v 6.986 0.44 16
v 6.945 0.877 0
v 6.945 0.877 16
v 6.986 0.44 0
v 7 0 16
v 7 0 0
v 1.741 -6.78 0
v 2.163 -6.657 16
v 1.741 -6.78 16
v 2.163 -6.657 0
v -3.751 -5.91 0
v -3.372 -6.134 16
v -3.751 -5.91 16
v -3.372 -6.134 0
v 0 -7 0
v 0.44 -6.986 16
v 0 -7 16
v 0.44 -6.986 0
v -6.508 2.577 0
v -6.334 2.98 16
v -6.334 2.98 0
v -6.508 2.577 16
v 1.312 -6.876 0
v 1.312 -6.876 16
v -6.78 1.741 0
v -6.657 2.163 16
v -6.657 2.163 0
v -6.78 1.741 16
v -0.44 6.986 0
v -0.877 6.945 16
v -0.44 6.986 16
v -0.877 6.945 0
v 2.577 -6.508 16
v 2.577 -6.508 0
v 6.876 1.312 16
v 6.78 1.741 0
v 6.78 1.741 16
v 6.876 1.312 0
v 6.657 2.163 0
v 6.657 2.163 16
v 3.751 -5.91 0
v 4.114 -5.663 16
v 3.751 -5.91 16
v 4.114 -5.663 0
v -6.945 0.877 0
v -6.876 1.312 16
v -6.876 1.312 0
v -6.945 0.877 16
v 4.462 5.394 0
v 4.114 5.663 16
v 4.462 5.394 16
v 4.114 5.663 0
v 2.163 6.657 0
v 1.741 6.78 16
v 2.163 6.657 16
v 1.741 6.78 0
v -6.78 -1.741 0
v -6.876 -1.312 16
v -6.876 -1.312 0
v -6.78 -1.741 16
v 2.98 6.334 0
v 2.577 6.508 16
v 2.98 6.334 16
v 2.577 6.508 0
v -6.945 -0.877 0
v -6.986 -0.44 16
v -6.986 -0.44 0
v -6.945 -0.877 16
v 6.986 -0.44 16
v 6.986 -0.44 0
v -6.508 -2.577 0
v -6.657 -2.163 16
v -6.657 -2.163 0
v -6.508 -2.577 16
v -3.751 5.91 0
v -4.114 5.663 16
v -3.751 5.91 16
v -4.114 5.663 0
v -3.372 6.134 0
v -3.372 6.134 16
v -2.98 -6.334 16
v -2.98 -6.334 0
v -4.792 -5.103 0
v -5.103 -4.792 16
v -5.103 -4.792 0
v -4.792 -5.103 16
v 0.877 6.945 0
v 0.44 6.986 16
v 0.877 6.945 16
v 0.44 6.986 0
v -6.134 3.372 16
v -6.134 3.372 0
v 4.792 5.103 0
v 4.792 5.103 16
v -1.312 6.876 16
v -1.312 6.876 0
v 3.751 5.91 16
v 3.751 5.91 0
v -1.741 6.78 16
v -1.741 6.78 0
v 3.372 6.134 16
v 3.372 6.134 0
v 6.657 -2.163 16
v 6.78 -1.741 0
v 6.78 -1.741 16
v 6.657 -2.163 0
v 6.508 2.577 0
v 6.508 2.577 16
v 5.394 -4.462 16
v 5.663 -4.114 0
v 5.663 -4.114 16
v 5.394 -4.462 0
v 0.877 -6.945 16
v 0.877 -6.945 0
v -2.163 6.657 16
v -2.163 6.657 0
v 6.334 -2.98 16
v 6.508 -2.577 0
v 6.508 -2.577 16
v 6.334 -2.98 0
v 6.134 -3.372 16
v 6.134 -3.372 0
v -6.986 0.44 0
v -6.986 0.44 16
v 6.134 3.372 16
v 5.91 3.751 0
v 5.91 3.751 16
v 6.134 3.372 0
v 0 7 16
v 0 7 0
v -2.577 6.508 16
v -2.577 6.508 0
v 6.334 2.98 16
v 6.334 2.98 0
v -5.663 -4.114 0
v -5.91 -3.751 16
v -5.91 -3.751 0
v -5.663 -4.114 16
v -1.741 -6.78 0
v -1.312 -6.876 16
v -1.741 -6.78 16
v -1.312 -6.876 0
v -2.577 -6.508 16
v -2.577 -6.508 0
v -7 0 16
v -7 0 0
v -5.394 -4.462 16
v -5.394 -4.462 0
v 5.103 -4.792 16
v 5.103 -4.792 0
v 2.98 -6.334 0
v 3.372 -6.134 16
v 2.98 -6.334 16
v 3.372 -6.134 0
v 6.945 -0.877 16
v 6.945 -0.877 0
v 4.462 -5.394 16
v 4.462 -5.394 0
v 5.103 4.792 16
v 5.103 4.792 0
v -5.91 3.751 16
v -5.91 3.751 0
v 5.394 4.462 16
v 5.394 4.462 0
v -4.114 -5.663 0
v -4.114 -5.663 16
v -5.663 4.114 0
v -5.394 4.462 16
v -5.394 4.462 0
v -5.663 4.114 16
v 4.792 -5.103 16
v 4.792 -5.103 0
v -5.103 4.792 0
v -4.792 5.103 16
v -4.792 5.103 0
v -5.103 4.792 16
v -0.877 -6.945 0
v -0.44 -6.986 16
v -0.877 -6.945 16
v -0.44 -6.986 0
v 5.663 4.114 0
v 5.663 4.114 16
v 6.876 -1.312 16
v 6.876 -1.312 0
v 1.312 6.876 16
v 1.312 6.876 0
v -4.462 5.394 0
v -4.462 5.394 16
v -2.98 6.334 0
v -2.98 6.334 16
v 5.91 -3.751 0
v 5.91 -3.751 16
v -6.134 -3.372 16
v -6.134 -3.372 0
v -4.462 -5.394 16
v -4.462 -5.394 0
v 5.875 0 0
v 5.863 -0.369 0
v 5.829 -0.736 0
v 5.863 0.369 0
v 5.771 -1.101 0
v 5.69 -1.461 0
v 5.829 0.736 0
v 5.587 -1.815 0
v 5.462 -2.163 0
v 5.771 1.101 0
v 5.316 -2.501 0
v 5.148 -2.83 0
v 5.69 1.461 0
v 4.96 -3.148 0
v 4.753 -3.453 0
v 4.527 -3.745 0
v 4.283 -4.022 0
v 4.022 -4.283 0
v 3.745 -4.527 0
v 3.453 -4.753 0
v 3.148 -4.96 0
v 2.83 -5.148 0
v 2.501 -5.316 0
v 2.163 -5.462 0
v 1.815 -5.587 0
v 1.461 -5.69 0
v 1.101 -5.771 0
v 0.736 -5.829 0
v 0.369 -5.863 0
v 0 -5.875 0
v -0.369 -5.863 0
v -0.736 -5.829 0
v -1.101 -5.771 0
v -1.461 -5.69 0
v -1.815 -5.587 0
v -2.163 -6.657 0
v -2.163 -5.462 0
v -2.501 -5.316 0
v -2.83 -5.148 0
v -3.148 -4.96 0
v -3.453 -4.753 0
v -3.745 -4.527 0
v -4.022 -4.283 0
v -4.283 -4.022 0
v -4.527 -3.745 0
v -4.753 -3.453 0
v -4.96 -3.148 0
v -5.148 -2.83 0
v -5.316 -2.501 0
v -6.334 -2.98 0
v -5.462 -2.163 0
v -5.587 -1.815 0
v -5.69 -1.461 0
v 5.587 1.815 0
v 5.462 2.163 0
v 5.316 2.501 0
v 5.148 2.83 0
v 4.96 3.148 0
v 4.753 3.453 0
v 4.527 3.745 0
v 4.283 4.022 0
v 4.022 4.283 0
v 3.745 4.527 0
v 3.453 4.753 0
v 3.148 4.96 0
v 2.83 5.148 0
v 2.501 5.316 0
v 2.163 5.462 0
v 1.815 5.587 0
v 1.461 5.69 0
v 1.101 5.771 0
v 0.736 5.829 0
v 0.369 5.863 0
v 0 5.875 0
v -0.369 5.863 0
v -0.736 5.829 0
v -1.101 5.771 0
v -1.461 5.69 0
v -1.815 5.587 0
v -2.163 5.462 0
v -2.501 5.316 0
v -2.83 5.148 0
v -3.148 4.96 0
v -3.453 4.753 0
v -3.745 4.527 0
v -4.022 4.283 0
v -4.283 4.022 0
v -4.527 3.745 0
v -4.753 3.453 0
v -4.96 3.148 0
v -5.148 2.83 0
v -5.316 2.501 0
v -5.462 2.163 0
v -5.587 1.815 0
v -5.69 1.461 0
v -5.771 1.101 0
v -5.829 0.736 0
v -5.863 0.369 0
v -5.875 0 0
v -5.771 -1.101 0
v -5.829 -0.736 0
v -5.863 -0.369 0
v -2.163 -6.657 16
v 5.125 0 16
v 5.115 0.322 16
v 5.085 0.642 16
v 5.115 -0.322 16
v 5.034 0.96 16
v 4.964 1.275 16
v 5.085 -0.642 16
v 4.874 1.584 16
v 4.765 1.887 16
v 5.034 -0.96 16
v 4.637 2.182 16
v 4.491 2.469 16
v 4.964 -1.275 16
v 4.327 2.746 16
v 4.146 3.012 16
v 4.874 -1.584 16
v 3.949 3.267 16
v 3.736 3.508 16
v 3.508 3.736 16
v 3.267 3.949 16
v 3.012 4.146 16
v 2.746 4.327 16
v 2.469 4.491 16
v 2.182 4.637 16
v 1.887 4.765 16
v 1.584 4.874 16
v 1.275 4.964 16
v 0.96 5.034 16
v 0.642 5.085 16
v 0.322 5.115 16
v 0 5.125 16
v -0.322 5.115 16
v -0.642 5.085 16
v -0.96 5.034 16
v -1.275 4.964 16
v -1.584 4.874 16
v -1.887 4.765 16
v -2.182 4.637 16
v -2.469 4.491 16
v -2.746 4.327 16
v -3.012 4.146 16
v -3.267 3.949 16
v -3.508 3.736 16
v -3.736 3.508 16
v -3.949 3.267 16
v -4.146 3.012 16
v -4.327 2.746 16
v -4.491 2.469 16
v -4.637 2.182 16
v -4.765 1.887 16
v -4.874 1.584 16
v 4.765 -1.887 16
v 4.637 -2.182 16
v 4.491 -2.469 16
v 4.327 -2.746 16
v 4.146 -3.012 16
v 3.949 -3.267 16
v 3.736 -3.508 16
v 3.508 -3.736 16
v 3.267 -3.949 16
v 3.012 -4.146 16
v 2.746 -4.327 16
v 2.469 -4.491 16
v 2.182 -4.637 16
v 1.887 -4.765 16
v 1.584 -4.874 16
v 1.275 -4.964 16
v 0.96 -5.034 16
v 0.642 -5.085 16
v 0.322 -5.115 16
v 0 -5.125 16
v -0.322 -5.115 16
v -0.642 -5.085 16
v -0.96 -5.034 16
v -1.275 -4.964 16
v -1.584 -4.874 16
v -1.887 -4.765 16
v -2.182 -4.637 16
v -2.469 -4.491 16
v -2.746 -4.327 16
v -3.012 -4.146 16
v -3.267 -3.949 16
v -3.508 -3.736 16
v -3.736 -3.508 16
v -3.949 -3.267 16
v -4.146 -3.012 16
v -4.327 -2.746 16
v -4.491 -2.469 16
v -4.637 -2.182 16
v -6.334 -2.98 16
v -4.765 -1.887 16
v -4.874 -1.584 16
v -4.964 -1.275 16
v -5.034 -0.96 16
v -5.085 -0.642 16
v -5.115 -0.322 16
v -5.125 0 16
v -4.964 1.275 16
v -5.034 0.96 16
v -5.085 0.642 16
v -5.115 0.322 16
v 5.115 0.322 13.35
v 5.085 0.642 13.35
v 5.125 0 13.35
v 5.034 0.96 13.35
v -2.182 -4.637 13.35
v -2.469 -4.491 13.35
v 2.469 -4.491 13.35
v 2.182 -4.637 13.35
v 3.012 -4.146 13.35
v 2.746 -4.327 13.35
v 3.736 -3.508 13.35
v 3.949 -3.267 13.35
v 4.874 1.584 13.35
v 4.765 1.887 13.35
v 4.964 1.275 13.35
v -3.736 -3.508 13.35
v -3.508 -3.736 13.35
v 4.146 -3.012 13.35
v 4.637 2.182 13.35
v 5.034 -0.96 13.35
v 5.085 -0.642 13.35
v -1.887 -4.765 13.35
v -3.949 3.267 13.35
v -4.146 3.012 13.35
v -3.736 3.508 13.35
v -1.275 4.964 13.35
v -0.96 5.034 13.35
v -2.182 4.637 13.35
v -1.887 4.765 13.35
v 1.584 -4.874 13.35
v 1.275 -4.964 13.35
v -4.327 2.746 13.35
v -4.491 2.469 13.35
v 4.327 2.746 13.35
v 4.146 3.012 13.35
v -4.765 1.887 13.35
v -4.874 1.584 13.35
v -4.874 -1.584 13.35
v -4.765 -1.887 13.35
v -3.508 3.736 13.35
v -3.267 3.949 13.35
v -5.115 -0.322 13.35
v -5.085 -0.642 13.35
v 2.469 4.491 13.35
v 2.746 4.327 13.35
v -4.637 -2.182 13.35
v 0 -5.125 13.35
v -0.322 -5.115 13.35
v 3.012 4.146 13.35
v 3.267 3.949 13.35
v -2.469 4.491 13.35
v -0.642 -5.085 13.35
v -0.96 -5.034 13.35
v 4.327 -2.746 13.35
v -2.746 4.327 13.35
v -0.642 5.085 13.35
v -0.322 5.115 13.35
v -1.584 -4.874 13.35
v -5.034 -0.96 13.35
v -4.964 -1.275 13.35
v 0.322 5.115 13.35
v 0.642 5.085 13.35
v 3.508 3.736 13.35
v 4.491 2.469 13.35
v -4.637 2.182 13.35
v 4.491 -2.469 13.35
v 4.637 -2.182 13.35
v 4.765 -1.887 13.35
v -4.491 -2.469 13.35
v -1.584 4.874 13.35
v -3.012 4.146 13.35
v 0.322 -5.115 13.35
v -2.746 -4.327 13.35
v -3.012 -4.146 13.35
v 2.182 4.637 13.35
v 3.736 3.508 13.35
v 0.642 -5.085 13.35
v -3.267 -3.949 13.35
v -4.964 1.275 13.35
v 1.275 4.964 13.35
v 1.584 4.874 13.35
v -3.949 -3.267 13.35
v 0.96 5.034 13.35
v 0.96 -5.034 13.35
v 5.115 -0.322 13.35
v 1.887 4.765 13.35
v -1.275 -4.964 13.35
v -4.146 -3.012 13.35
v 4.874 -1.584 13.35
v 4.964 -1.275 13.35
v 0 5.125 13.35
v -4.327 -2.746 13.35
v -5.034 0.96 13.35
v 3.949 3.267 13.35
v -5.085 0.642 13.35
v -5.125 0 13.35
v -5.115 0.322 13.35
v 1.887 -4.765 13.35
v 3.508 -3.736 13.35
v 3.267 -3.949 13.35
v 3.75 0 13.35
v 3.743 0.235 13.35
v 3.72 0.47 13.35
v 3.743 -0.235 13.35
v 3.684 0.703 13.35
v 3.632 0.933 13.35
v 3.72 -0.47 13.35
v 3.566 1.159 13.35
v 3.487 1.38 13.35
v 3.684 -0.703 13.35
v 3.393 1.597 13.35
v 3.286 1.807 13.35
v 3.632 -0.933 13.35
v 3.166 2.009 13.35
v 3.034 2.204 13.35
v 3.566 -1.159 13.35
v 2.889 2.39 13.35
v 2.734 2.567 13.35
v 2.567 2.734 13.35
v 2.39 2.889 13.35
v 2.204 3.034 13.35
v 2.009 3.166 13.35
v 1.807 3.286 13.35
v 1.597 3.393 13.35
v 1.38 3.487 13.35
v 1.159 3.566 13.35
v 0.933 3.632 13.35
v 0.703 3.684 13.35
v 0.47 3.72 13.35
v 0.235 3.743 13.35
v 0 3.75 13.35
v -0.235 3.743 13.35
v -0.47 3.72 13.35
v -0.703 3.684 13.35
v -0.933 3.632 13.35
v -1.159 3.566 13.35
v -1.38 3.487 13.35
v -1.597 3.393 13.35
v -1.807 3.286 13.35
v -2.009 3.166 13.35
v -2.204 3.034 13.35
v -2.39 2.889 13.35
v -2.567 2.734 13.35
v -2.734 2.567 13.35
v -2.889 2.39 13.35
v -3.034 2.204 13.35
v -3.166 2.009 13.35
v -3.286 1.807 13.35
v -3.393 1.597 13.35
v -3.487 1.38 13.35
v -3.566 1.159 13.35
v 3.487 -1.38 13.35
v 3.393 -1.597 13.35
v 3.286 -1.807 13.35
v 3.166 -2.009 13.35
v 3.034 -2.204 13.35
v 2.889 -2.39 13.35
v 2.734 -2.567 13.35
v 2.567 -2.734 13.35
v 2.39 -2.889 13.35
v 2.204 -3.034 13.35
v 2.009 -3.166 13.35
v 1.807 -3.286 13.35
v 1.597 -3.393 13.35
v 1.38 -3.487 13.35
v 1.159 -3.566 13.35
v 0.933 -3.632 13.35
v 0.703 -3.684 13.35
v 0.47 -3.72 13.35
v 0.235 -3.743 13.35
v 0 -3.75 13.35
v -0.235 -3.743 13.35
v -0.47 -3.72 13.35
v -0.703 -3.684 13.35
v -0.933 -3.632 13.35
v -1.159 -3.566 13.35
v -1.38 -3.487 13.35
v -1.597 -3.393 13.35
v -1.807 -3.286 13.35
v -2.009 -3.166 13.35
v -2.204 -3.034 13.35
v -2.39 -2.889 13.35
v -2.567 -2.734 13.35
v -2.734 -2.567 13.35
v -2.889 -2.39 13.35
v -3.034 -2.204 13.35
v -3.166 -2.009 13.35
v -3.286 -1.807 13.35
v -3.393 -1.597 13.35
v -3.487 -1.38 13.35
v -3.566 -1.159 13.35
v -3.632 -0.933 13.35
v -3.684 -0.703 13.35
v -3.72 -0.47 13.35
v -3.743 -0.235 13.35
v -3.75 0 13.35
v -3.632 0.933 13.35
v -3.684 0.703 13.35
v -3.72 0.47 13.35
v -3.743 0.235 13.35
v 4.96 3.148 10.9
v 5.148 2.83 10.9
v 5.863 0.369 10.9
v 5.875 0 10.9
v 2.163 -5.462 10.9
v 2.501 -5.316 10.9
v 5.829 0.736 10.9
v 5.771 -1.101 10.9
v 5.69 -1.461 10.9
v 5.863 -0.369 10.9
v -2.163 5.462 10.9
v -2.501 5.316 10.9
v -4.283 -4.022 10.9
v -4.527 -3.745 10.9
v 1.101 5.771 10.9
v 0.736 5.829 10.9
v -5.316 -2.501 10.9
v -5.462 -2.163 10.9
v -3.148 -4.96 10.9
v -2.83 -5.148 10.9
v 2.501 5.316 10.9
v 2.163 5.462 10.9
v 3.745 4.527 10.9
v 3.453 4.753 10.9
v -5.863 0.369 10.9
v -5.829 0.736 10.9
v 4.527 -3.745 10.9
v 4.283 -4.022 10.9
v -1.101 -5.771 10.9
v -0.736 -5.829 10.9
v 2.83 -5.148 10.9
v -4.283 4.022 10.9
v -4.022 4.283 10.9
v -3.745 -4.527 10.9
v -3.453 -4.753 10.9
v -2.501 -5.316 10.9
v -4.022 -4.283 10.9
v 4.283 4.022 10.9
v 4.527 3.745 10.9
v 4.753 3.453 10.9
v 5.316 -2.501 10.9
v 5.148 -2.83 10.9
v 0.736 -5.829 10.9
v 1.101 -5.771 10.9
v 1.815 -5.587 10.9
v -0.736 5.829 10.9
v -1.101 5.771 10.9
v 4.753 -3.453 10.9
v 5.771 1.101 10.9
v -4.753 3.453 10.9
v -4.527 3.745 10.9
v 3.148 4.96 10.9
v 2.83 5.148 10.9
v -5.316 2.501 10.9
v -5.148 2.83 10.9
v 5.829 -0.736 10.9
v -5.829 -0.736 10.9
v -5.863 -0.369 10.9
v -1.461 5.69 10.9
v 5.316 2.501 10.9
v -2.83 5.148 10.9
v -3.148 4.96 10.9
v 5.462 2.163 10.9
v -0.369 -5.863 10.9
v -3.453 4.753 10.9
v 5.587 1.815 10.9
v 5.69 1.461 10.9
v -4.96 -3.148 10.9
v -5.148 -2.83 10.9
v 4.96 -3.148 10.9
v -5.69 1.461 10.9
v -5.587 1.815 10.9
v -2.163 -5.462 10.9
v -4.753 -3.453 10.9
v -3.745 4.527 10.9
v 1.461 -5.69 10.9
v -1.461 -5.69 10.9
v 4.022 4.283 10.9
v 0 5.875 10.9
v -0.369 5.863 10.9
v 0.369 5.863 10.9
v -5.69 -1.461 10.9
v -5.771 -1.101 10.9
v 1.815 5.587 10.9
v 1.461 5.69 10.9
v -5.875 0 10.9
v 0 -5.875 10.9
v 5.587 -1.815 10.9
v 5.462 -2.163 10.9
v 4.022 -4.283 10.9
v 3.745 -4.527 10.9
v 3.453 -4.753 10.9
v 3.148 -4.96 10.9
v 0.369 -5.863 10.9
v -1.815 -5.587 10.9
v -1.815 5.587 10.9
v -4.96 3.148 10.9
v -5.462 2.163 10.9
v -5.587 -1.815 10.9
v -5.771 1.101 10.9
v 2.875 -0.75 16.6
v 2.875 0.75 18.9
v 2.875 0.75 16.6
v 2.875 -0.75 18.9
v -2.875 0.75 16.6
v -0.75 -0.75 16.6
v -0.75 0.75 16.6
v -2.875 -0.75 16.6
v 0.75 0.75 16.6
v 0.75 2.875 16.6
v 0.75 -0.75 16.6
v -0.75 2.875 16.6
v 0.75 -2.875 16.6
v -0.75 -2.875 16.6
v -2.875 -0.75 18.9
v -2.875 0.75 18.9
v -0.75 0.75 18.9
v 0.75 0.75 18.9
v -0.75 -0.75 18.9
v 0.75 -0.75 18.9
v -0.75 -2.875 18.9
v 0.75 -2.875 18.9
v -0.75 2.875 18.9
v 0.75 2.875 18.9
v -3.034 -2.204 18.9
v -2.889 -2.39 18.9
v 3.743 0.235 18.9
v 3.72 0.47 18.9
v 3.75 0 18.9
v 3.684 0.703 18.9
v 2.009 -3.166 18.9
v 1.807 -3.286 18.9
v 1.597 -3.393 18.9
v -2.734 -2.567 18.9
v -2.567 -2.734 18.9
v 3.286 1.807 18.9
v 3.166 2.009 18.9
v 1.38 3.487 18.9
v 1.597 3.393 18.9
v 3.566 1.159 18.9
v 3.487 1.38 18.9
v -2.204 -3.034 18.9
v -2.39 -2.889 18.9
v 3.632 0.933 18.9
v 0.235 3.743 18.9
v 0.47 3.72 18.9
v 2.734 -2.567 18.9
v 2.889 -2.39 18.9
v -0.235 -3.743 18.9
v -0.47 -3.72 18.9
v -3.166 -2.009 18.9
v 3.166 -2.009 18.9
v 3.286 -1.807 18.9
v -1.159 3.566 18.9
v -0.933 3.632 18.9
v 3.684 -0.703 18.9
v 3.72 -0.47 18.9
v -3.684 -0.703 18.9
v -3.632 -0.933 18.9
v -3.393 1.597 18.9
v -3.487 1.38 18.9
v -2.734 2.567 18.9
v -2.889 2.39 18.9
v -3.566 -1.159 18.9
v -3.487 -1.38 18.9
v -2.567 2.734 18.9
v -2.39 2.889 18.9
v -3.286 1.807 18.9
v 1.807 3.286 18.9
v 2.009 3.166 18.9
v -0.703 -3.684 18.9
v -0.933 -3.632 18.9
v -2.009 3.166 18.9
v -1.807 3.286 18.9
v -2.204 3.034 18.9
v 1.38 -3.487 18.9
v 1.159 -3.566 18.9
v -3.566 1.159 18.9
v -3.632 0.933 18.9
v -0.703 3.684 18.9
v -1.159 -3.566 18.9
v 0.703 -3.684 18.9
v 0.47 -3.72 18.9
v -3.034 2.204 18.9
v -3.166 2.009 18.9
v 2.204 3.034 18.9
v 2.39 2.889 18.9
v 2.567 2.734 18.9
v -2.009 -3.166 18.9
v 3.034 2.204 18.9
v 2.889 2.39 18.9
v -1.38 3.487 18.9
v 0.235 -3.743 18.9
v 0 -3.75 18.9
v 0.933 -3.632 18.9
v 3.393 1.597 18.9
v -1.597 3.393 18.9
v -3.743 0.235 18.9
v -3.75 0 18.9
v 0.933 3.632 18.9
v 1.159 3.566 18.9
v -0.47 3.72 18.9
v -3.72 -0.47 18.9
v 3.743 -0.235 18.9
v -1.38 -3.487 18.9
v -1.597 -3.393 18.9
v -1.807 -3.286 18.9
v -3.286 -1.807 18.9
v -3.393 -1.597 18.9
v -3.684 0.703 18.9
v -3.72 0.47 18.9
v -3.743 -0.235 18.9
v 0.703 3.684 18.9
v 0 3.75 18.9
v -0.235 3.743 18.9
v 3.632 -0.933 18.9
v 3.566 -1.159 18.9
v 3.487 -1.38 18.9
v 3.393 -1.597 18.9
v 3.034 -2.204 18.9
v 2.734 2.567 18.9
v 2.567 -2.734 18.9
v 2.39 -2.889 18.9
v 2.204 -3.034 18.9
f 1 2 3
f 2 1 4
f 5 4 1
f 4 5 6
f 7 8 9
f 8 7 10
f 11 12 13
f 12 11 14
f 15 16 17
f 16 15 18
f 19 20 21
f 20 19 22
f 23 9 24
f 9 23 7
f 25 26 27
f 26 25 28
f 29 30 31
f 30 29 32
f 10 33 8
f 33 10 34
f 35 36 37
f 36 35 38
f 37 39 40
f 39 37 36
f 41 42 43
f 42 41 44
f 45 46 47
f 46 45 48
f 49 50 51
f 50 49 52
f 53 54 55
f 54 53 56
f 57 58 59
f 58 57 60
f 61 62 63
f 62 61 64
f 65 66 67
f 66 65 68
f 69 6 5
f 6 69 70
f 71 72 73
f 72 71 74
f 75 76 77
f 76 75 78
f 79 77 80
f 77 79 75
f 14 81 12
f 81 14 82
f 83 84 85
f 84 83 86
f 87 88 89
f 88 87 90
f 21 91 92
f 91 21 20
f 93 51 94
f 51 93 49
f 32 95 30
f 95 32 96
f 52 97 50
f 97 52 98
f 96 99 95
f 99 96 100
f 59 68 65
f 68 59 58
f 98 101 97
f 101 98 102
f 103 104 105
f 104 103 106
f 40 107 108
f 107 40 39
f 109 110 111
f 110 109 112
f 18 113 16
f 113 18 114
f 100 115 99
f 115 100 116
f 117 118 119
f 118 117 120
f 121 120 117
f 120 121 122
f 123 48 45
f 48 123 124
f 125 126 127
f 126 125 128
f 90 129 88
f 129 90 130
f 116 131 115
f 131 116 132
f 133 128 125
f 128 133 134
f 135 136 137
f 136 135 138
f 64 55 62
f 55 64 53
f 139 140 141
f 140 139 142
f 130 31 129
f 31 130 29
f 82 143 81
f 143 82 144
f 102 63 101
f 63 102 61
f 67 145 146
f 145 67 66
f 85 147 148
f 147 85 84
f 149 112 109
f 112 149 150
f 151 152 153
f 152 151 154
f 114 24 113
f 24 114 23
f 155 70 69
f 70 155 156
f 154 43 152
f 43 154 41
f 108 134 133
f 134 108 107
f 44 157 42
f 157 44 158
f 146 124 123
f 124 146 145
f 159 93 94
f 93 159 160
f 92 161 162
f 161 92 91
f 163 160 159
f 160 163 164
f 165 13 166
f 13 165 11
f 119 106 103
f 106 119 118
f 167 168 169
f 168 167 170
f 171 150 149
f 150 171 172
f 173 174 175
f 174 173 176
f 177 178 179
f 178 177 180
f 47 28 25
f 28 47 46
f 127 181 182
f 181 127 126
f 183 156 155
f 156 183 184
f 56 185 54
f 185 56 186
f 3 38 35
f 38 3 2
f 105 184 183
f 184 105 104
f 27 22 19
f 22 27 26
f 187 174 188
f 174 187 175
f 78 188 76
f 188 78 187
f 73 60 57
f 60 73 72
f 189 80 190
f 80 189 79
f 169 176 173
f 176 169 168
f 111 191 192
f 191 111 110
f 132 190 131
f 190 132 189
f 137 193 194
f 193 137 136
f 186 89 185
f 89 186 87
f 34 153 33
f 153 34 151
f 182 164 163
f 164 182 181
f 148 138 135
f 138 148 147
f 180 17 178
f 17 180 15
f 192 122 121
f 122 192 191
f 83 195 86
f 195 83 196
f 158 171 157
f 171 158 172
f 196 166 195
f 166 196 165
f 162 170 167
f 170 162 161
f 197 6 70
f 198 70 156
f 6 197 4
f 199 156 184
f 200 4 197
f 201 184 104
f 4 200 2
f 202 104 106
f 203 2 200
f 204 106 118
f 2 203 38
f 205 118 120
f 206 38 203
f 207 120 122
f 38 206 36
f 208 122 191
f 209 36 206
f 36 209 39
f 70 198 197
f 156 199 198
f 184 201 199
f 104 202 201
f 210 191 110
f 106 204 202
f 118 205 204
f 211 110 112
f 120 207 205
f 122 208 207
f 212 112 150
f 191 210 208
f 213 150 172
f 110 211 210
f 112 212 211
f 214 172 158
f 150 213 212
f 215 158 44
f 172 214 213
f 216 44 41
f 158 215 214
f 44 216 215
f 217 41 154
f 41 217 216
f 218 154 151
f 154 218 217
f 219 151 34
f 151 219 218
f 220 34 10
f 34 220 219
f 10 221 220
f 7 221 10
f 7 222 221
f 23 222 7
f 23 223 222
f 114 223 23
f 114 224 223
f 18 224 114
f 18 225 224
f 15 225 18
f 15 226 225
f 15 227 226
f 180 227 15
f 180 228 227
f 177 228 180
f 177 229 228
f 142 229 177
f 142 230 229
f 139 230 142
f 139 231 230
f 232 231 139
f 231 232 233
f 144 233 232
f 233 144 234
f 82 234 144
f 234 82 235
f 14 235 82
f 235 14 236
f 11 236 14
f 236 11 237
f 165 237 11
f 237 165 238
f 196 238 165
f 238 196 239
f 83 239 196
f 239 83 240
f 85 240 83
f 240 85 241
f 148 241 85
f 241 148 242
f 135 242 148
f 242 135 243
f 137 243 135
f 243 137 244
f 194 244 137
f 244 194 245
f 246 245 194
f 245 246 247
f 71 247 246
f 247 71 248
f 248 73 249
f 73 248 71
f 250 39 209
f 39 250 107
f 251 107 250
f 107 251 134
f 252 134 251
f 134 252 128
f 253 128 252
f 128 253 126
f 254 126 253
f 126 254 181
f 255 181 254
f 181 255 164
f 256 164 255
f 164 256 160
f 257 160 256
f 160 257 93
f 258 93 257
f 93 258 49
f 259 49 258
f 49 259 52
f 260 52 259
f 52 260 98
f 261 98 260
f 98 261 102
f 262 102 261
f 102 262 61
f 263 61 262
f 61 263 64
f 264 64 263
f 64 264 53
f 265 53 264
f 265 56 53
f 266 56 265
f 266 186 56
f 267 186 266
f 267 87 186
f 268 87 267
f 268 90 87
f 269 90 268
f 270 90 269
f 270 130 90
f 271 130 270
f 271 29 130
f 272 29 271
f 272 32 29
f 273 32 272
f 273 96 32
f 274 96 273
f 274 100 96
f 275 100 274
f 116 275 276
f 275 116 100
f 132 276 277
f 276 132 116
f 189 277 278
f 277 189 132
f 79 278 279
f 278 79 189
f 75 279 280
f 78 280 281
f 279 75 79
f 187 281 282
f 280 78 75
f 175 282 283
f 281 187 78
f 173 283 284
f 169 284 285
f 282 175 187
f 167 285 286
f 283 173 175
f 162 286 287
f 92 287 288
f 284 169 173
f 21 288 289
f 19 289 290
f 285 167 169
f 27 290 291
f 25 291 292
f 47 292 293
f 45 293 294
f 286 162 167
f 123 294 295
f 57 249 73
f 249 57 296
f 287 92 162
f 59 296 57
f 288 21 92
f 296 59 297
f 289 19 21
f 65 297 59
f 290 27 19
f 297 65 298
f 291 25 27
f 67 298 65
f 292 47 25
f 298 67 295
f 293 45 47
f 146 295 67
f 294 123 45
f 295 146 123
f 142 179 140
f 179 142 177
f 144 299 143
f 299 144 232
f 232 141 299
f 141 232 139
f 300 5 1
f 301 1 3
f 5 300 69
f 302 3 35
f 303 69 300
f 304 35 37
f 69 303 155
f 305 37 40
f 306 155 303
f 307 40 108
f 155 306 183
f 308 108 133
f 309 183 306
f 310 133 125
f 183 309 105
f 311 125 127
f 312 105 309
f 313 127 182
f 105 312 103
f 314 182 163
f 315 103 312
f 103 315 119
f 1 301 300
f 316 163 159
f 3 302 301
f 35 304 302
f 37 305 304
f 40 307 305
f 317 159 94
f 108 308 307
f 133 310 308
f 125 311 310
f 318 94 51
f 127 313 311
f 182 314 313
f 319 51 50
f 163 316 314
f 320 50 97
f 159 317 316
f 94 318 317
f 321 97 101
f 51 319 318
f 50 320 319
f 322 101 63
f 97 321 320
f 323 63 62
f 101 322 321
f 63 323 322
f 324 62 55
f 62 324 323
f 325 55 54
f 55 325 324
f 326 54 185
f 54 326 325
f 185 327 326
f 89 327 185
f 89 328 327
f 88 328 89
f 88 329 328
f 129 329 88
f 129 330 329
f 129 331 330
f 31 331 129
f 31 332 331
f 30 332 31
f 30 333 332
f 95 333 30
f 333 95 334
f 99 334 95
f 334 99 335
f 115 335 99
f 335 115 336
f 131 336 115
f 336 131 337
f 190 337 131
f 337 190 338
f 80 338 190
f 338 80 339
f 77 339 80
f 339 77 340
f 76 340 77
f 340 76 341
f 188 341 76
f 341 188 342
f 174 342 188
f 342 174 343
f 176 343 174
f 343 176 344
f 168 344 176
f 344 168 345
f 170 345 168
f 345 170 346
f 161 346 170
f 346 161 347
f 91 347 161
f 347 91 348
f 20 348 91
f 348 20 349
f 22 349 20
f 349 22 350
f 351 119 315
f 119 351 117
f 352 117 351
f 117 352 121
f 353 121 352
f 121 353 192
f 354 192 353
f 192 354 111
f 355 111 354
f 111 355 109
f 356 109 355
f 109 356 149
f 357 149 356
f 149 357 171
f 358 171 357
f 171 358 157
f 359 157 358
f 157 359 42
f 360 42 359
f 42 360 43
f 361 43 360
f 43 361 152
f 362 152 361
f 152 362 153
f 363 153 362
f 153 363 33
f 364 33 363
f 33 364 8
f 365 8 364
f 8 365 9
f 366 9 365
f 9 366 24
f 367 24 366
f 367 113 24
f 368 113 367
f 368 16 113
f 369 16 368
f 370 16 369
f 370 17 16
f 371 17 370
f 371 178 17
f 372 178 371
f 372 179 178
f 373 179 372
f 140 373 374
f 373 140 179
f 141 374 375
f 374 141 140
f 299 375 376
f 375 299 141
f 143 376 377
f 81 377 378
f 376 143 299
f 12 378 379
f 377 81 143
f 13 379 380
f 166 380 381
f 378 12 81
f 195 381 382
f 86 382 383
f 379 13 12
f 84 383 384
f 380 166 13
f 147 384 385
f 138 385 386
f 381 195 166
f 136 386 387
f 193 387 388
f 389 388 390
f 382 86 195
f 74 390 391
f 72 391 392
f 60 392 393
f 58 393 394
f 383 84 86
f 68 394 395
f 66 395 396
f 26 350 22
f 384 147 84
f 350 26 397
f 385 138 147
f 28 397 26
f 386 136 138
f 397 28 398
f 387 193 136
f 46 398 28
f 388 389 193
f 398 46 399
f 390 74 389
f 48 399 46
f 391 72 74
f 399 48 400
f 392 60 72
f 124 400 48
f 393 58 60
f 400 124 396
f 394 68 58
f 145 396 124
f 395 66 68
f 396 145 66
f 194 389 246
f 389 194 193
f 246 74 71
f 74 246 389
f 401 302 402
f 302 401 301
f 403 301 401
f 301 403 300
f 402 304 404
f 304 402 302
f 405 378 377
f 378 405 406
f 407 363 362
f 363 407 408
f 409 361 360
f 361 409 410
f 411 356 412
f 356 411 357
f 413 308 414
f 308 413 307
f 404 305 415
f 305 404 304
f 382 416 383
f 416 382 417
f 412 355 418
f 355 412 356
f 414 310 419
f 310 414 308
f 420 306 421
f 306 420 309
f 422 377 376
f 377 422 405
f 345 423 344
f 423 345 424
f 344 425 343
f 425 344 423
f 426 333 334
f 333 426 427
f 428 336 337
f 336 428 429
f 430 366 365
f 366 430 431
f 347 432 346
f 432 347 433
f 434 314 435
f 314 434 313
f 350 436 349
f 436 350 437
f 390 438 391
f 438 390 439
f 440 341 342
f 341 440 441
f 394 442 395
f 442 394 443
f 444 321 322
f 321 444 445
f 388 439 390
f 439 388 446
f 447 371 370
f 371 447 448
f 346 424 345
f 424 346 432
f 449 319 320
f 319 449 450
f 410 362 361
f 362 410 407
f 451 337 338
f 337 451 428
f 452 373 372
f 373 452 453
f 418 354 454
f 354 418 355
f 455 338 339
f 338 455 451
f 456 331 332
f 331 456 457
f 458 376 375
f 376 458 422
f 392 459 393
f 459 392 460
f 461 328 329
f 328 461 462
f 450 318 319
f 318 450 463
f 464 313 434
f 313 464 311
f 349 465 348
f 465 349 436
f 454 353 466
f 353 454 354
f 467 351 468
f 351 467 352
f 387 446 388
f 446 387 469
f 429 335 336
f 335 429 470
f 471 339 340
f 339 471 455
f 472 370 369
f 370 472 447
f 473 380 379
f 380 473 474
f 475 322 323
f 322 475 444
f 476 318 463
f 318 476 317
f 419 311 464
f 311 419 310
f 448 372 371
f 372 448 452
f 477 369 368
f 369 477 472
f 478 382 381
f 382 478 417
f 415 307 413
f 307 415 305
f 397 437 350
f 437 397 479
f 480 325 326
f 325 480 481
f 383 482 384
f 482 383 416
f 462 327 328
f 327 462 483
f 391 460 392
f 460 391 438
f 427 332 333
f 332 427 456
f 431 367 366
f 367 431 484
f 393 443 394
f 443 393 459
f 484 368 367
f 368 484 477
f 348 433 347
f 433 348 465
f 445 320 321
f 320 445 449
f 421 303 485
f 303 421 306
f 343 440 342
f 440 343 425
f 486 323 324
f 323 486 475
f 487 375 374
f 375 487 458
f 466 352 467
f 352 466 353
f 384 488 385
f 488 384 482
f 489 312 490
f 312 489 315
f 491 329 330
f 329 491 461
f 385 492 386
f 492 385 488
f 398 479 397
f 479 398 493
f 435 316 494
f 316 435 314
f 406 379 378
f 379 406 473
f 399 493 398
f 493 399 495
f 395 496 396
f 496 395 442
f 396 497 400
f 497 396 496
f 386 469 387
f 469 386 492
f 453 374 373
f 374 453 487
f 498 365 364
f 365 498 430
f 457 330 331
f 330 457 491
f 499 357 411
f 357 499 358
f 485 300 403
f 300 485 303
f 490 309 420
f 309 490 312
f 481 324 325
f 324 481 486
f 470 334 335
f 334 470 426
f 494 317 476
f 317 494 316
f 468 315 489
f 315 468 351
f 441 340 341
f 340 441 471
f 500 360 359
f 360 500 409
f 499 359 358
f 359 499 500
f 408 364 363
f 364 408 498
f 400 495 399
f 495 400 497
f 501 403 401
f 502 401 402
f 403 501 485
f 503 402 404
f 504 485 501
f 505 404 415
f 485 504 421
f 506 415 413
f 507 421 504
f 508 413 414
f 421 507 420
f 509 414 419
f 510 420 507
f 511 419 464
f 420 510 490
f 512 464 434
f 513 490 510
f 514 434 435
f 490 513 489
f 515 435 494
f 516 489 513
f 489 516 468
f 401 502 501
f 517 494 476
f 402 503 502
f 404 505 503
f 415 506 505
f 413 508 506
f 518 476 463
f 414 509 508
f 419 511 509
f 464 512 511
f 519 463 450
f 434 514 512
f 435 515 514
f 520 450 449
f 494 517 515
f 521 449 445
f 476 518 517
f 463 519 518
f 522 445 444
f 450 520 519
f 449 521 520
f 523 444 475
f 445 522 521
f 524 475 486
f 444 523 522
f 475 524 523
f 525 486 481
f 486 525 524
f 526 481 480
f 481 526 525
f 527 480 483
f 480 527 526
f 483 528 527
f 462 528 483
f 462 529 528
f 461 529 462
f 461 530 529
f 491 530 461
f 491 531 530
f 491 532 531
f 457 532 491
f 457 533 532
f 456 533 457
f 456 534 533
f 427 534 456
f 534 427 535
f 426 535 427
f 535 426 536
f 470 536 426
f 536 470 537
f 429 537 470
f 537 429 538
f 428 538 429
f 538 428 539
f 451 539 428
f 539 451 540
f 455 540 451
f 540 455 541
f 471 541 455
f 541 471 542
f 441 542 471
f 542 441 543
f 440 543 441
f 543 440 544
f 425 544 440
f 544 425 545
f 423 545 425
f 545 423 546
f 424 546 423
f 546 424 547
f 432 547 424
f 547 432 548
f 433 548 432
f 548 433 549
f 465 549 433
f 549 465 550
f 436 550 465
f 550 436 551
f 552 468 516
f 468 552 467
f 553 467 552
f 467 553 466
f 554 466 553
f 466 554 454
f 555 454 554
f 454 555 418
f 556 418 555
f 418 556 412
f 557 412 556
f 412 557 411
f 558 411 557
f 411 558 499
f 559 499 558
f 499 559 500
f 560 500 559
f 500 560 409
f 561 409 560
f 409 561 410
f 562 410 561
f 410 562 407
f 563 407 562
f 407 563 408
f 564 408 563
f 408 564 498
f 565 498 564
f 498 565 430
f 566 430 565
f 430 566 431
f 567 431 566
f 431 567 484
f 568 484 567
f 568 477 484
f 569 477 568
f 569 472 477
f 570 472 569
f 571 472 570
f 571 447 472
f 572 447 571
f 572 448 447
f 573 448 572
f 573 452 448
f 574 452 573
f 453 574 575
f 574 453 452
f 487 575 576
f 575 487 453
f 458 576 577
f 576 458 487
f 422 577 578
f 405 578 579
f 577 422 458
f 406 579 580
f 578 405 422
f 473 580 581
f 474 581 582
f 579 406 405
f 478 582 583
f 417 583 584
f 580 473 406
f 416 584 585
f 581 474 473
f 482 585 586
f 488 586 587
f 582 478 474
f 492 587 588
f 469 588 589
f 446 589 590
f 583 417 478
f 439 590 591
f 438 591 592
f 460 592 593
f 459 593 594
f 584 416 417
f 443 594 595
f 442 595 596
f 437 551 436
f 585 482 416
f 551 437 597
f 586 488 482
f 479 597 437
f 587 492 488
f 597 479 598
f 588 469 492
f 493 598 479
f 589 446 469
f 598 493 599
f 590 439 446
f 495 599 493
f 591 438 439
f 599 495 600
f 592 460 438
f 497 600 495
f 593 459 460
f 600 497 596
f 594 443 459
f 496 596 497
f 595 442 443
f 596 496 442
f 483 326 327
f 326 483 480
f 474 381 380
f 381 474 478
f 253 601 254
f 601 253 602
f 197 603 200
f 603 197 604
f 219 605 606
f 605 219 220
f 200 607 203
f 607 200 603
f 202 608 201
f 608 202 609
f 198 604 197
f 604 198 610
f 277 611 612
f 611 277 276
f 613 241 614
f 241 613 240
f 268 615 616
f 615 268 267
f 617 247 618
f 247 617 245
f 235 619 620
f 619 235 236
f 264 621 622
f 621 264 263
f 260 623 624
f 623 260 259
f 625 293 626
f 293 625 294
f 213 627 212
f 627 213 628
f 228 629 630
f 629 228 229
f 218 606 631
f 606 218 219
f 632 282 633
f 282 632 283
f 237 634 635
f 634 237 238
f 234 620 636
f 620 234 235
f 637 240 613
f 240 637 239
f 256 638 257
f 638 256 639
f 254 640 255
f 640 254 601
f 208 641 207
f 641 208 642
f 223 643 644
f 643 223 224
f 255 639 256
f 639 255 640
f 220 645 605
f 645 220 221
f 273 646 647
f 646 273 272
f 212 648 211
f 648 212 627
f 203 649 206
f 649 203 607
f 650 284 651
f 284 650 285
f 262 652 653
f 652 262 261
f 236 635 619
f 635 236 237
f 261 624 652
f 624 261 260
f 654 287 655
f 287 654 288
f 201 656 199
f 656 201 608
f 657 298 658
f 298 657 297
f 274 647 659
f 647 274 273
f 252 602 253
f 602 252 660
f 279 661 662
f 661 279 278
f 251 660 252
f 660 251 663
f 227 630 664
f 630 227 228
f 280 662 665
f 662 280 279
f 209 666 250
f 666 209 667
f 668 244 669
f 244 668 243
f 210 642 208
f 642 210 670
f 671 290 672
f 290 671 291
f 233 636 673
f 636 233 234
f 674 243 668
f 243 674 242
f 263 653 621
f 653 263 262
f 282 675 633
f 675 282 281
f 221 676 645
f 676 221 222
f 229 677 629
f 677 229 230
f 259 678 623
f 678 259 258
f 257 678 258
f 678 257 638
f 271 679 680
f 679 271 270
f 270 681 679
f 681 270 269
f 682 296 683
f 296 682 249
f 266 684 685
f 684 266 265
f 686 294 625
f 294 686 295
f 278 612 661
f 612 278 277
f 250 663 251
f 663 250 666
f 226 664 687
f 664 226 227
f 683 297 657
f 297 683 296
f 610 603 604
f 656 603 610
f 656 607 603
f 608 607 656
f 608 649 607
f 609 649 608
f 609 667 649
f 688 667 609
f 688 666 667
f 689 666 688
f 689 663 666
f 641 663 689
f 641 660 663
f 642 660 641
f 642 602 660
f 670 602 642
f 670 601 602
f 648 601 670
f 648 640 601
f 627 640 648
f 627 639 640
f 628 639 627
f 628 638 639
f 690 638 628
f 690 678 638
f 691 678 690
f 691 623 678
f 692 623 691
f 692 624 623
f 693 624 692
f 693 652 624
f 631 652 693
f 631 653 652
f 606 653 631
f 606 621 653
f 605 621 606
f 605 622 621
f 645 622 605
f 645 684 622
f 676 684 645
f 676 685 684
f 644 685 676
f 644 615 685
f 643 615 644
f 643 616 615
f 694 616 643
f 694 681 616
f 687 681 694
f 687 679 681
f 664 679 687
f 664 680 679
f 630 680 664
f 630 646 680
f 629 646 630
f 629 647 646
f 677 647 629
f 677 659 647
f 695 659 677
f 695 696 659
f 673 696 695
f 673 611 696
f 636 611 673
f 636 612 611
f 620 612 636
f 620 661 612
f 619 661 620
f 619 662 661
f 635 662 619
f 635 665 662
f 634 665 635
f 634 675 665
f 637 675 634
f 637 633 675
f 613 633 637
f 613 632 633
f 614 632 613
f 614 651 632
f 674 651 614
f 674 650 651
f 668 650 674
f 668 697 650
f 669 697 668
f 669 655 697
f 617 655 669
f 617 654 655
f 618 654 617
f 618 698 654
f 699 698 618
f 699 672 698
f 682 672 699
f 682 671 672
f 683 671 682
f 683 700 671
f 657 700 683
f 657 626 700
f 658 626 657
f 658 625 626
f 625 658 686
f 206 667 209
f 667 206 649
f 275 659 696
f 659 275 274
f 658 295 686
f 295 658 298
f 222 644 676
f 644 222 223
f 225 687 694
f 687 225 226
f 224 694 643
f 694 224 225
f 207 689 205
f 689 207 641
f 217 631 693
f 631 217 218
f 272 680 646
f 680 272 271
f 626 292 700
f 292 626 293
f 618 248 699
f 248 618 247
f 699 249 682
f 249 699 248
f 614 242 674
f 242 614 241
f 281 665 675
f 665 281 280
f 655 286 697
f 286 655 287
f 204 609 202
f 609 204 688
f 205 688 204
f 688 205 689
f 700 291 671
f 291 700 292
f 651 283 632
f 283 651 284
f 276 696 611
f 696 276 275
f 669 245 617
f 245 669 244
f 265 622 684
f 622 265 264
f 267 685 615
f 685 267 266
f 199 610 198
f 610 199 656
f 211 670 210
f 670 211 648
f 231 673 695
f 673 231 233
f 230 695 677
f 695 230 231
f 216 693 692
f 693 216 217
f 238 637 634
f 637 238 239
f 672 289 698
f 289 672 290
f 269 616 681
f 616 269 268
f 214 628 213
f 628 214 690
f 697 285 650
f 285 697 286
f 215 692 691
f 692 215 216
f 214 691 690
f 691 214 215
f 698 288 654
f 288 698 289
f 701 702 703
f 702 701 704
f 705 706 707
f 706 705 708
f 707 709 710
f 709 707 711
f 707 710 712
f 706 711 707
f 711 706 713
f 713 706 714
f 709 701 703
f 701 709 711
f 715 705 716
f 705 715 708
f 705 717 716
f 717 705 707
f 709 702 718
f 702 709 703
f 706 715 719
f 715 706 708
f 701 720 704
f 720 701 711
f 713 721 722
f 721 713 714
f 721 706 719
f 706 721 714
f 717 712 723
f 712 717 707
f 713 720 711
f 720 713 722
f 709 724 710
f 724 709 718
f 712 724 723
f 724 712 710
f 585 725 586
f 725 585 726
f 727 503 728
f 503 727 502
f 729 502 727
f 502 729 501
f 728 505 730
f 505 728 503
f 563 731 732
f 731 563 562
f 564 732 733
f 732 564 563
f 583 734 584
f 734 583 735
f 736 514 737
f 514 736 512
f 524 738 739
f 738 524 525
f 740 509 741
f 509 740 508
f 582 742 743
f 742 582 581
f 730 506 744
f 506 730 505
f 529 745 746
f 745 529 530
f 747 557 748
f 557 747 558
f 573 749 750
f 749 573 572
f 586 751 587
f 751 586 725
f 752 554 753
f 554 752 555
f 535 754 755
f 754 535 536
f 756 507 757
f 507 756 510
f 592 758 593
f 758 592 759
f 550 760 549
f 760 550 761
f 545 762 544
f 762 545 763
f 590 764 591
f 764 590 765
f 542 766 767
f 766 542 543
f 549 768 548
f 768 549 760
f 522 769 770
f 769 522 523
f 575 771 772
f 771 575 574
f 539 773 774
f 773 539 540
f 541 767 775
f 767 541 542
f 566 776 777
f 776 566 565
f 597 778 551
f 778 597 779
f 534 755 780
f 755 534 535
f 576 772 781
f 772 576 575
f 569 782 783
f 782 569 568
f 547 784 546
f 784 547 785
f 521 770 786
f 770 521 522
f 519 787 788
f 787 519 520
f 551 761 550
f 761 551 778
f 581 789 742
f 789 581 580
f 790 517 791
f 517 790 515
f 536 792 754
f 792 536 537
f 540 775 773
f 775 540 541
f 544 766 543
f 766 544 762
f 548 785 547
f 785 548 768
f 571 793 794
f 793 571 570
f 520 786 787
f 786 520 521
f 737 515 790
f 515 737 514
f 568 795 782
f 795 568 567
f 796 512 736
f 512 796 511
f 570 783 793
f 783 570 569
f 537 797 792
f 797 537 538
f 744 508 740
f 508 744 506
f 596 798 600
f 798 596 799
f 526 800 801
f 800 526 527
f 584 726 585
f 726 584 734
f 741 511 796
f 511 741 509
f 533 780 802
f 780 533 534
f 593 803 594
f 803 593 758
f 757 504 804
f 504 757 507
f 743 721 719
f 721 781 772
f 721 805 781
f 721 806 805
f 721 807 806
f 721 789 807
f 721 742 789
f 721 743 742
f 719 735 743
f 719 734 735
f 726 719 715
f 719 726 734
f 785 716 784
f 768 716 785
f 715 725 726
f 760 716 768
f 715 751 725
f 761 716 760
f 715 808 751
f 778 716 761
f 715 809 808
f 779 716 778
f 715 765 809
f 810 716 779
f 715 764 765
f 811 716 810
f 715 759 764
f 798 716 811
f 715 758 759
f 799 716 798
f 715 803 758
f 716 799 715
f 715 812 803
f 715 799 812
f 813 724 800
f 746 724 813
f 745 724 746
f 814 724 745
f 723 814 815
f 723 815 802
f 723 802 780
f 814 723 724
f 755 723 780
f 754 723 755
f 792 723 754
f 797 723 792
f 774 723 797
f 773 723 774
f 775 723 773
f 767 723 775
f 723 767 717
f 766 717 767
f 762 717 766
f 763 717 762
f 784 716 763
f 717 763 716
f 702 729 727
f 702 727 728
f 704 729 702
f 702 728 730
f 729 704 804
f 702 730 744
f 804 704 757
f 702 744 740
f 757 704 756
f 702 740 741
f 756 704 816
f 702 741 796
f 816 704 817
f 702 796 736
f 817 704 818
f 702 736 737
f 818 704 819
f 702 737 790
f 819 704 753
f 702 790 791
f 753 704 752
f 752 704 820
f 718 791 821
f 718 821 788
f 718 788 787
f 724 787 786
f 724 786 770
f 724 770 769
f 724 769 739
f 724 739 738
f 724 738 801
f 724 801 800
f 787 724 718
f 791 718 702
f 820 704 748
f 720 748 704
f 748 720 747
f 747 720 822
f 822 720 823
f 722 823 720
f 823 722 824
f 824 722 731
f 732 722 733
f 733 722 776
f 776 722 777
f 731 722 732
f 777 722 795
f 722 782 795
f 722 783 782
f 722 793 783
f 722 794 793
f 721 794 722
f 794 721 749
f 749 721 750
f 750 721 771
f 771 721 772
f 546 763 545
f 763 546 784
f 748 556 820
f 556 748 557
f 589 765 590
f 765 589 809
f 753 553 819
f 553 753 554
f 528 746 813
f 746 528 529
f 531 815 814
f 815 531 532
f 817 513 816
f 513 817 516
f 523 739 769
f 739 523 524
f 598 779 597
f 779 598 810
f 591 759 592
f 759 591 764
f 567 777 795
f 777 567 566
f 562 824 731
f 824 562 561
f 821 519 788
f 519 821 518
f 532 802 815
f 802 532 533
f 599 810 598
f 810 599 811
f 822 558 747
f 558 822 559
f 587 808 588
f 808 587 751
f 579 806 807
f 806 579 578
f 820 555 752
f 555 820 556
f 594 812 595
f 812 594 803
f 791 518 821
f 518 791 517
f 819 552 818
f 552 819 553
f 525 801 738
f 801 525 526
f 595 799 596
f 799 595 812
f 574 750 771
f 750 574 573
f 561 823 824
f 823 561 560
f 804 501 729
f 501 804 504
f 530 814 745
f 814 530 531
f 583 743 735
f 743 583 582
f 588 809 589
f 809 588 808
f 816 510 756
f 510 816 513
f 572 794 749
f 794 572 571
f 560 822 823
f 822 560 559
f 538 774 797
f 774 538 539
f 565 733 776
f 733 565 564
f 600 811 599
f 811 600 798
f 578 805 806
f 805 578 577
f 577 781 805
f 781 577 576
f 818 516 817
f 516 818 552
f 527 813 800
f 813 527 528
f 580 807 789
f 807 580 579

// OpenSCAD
// height of the main part of the spool
SPOOLH = 16;

// diameter of the main part of the spool
SPOOLDIA = 14;

// height of the screw above the top of the cartridge
SCREWH = 3;

// diameter of the takeup feed screw
SCREWDIA = 7.5;

// screw (crosspoint) parameters
CROSSWIDTH = 5.75;				// width of the cross-point
CROSSTHICK = 1.5;			// thickness of the cross-point segments
CROSSDEPTH = 2.5;			// how deep the cross-point digs into the screwhead


// recess around screw parameters
RECESSDEP = 2.75;			// how deep the recess cuts into the spool
RECESSDIA = 10.25;			// the diameter of the recess

// hub parameters
HUBDIA = 11.75;				// diameter of the hub
HUBDEP = 11;				// depth of the hub

///////////////////////////////////////////////////////////////////////////////////////////////////

// fudge
FUDGE = 0.1;

// make round objects more accurate
$fn = 100;

///////////////////////////////////////////////////////////////////////////////////////////////////


// generate a positive form of the cross-point on the hub feed screwhead
module crosspoint(h=1.0)
{
	translate([-CROSSWIDTH/2, -CROSSTHICK/2, 0])
		union() {
			cube([CROSSWIDTH, CROSSTHICK, CROSSDEPTH]);
			translate([(CROSSWIDTH+CROSSTHICK)/2,-(CROSSWIDTH-CROSSTHICK)/2,0]) rotate([0,0,90]) cube([CROSSWIDTH, CROSSTHICK, CROSSDEPTH]);
		}
}

union() {
	difference() {
		cylinder(h=SPOOLH, d=SPOOLDIA);		// main spool body
		translate([0,0,SPOOLH-RECESSDEP+FUDGE]) cylinder(h=RECESSDEP, d=RECESSDIA);		// recess around screwhead
		translate([0,0,-FUDGE]) cylinder(h=HUBDEP, d=HUBDIA);
	}

	difference() {
		translate([0,0,SPOOLH-RECESSDEP-FUDGE]) cylinder(h=SCREWH+RECESSDEP, d=SCREWDIA);	// screw head
		translate([0,0,SPOOLH+SCREWH-CROSSDEPTH+FUDGE])	crosspoint();
	}
}

//crosspoint();
